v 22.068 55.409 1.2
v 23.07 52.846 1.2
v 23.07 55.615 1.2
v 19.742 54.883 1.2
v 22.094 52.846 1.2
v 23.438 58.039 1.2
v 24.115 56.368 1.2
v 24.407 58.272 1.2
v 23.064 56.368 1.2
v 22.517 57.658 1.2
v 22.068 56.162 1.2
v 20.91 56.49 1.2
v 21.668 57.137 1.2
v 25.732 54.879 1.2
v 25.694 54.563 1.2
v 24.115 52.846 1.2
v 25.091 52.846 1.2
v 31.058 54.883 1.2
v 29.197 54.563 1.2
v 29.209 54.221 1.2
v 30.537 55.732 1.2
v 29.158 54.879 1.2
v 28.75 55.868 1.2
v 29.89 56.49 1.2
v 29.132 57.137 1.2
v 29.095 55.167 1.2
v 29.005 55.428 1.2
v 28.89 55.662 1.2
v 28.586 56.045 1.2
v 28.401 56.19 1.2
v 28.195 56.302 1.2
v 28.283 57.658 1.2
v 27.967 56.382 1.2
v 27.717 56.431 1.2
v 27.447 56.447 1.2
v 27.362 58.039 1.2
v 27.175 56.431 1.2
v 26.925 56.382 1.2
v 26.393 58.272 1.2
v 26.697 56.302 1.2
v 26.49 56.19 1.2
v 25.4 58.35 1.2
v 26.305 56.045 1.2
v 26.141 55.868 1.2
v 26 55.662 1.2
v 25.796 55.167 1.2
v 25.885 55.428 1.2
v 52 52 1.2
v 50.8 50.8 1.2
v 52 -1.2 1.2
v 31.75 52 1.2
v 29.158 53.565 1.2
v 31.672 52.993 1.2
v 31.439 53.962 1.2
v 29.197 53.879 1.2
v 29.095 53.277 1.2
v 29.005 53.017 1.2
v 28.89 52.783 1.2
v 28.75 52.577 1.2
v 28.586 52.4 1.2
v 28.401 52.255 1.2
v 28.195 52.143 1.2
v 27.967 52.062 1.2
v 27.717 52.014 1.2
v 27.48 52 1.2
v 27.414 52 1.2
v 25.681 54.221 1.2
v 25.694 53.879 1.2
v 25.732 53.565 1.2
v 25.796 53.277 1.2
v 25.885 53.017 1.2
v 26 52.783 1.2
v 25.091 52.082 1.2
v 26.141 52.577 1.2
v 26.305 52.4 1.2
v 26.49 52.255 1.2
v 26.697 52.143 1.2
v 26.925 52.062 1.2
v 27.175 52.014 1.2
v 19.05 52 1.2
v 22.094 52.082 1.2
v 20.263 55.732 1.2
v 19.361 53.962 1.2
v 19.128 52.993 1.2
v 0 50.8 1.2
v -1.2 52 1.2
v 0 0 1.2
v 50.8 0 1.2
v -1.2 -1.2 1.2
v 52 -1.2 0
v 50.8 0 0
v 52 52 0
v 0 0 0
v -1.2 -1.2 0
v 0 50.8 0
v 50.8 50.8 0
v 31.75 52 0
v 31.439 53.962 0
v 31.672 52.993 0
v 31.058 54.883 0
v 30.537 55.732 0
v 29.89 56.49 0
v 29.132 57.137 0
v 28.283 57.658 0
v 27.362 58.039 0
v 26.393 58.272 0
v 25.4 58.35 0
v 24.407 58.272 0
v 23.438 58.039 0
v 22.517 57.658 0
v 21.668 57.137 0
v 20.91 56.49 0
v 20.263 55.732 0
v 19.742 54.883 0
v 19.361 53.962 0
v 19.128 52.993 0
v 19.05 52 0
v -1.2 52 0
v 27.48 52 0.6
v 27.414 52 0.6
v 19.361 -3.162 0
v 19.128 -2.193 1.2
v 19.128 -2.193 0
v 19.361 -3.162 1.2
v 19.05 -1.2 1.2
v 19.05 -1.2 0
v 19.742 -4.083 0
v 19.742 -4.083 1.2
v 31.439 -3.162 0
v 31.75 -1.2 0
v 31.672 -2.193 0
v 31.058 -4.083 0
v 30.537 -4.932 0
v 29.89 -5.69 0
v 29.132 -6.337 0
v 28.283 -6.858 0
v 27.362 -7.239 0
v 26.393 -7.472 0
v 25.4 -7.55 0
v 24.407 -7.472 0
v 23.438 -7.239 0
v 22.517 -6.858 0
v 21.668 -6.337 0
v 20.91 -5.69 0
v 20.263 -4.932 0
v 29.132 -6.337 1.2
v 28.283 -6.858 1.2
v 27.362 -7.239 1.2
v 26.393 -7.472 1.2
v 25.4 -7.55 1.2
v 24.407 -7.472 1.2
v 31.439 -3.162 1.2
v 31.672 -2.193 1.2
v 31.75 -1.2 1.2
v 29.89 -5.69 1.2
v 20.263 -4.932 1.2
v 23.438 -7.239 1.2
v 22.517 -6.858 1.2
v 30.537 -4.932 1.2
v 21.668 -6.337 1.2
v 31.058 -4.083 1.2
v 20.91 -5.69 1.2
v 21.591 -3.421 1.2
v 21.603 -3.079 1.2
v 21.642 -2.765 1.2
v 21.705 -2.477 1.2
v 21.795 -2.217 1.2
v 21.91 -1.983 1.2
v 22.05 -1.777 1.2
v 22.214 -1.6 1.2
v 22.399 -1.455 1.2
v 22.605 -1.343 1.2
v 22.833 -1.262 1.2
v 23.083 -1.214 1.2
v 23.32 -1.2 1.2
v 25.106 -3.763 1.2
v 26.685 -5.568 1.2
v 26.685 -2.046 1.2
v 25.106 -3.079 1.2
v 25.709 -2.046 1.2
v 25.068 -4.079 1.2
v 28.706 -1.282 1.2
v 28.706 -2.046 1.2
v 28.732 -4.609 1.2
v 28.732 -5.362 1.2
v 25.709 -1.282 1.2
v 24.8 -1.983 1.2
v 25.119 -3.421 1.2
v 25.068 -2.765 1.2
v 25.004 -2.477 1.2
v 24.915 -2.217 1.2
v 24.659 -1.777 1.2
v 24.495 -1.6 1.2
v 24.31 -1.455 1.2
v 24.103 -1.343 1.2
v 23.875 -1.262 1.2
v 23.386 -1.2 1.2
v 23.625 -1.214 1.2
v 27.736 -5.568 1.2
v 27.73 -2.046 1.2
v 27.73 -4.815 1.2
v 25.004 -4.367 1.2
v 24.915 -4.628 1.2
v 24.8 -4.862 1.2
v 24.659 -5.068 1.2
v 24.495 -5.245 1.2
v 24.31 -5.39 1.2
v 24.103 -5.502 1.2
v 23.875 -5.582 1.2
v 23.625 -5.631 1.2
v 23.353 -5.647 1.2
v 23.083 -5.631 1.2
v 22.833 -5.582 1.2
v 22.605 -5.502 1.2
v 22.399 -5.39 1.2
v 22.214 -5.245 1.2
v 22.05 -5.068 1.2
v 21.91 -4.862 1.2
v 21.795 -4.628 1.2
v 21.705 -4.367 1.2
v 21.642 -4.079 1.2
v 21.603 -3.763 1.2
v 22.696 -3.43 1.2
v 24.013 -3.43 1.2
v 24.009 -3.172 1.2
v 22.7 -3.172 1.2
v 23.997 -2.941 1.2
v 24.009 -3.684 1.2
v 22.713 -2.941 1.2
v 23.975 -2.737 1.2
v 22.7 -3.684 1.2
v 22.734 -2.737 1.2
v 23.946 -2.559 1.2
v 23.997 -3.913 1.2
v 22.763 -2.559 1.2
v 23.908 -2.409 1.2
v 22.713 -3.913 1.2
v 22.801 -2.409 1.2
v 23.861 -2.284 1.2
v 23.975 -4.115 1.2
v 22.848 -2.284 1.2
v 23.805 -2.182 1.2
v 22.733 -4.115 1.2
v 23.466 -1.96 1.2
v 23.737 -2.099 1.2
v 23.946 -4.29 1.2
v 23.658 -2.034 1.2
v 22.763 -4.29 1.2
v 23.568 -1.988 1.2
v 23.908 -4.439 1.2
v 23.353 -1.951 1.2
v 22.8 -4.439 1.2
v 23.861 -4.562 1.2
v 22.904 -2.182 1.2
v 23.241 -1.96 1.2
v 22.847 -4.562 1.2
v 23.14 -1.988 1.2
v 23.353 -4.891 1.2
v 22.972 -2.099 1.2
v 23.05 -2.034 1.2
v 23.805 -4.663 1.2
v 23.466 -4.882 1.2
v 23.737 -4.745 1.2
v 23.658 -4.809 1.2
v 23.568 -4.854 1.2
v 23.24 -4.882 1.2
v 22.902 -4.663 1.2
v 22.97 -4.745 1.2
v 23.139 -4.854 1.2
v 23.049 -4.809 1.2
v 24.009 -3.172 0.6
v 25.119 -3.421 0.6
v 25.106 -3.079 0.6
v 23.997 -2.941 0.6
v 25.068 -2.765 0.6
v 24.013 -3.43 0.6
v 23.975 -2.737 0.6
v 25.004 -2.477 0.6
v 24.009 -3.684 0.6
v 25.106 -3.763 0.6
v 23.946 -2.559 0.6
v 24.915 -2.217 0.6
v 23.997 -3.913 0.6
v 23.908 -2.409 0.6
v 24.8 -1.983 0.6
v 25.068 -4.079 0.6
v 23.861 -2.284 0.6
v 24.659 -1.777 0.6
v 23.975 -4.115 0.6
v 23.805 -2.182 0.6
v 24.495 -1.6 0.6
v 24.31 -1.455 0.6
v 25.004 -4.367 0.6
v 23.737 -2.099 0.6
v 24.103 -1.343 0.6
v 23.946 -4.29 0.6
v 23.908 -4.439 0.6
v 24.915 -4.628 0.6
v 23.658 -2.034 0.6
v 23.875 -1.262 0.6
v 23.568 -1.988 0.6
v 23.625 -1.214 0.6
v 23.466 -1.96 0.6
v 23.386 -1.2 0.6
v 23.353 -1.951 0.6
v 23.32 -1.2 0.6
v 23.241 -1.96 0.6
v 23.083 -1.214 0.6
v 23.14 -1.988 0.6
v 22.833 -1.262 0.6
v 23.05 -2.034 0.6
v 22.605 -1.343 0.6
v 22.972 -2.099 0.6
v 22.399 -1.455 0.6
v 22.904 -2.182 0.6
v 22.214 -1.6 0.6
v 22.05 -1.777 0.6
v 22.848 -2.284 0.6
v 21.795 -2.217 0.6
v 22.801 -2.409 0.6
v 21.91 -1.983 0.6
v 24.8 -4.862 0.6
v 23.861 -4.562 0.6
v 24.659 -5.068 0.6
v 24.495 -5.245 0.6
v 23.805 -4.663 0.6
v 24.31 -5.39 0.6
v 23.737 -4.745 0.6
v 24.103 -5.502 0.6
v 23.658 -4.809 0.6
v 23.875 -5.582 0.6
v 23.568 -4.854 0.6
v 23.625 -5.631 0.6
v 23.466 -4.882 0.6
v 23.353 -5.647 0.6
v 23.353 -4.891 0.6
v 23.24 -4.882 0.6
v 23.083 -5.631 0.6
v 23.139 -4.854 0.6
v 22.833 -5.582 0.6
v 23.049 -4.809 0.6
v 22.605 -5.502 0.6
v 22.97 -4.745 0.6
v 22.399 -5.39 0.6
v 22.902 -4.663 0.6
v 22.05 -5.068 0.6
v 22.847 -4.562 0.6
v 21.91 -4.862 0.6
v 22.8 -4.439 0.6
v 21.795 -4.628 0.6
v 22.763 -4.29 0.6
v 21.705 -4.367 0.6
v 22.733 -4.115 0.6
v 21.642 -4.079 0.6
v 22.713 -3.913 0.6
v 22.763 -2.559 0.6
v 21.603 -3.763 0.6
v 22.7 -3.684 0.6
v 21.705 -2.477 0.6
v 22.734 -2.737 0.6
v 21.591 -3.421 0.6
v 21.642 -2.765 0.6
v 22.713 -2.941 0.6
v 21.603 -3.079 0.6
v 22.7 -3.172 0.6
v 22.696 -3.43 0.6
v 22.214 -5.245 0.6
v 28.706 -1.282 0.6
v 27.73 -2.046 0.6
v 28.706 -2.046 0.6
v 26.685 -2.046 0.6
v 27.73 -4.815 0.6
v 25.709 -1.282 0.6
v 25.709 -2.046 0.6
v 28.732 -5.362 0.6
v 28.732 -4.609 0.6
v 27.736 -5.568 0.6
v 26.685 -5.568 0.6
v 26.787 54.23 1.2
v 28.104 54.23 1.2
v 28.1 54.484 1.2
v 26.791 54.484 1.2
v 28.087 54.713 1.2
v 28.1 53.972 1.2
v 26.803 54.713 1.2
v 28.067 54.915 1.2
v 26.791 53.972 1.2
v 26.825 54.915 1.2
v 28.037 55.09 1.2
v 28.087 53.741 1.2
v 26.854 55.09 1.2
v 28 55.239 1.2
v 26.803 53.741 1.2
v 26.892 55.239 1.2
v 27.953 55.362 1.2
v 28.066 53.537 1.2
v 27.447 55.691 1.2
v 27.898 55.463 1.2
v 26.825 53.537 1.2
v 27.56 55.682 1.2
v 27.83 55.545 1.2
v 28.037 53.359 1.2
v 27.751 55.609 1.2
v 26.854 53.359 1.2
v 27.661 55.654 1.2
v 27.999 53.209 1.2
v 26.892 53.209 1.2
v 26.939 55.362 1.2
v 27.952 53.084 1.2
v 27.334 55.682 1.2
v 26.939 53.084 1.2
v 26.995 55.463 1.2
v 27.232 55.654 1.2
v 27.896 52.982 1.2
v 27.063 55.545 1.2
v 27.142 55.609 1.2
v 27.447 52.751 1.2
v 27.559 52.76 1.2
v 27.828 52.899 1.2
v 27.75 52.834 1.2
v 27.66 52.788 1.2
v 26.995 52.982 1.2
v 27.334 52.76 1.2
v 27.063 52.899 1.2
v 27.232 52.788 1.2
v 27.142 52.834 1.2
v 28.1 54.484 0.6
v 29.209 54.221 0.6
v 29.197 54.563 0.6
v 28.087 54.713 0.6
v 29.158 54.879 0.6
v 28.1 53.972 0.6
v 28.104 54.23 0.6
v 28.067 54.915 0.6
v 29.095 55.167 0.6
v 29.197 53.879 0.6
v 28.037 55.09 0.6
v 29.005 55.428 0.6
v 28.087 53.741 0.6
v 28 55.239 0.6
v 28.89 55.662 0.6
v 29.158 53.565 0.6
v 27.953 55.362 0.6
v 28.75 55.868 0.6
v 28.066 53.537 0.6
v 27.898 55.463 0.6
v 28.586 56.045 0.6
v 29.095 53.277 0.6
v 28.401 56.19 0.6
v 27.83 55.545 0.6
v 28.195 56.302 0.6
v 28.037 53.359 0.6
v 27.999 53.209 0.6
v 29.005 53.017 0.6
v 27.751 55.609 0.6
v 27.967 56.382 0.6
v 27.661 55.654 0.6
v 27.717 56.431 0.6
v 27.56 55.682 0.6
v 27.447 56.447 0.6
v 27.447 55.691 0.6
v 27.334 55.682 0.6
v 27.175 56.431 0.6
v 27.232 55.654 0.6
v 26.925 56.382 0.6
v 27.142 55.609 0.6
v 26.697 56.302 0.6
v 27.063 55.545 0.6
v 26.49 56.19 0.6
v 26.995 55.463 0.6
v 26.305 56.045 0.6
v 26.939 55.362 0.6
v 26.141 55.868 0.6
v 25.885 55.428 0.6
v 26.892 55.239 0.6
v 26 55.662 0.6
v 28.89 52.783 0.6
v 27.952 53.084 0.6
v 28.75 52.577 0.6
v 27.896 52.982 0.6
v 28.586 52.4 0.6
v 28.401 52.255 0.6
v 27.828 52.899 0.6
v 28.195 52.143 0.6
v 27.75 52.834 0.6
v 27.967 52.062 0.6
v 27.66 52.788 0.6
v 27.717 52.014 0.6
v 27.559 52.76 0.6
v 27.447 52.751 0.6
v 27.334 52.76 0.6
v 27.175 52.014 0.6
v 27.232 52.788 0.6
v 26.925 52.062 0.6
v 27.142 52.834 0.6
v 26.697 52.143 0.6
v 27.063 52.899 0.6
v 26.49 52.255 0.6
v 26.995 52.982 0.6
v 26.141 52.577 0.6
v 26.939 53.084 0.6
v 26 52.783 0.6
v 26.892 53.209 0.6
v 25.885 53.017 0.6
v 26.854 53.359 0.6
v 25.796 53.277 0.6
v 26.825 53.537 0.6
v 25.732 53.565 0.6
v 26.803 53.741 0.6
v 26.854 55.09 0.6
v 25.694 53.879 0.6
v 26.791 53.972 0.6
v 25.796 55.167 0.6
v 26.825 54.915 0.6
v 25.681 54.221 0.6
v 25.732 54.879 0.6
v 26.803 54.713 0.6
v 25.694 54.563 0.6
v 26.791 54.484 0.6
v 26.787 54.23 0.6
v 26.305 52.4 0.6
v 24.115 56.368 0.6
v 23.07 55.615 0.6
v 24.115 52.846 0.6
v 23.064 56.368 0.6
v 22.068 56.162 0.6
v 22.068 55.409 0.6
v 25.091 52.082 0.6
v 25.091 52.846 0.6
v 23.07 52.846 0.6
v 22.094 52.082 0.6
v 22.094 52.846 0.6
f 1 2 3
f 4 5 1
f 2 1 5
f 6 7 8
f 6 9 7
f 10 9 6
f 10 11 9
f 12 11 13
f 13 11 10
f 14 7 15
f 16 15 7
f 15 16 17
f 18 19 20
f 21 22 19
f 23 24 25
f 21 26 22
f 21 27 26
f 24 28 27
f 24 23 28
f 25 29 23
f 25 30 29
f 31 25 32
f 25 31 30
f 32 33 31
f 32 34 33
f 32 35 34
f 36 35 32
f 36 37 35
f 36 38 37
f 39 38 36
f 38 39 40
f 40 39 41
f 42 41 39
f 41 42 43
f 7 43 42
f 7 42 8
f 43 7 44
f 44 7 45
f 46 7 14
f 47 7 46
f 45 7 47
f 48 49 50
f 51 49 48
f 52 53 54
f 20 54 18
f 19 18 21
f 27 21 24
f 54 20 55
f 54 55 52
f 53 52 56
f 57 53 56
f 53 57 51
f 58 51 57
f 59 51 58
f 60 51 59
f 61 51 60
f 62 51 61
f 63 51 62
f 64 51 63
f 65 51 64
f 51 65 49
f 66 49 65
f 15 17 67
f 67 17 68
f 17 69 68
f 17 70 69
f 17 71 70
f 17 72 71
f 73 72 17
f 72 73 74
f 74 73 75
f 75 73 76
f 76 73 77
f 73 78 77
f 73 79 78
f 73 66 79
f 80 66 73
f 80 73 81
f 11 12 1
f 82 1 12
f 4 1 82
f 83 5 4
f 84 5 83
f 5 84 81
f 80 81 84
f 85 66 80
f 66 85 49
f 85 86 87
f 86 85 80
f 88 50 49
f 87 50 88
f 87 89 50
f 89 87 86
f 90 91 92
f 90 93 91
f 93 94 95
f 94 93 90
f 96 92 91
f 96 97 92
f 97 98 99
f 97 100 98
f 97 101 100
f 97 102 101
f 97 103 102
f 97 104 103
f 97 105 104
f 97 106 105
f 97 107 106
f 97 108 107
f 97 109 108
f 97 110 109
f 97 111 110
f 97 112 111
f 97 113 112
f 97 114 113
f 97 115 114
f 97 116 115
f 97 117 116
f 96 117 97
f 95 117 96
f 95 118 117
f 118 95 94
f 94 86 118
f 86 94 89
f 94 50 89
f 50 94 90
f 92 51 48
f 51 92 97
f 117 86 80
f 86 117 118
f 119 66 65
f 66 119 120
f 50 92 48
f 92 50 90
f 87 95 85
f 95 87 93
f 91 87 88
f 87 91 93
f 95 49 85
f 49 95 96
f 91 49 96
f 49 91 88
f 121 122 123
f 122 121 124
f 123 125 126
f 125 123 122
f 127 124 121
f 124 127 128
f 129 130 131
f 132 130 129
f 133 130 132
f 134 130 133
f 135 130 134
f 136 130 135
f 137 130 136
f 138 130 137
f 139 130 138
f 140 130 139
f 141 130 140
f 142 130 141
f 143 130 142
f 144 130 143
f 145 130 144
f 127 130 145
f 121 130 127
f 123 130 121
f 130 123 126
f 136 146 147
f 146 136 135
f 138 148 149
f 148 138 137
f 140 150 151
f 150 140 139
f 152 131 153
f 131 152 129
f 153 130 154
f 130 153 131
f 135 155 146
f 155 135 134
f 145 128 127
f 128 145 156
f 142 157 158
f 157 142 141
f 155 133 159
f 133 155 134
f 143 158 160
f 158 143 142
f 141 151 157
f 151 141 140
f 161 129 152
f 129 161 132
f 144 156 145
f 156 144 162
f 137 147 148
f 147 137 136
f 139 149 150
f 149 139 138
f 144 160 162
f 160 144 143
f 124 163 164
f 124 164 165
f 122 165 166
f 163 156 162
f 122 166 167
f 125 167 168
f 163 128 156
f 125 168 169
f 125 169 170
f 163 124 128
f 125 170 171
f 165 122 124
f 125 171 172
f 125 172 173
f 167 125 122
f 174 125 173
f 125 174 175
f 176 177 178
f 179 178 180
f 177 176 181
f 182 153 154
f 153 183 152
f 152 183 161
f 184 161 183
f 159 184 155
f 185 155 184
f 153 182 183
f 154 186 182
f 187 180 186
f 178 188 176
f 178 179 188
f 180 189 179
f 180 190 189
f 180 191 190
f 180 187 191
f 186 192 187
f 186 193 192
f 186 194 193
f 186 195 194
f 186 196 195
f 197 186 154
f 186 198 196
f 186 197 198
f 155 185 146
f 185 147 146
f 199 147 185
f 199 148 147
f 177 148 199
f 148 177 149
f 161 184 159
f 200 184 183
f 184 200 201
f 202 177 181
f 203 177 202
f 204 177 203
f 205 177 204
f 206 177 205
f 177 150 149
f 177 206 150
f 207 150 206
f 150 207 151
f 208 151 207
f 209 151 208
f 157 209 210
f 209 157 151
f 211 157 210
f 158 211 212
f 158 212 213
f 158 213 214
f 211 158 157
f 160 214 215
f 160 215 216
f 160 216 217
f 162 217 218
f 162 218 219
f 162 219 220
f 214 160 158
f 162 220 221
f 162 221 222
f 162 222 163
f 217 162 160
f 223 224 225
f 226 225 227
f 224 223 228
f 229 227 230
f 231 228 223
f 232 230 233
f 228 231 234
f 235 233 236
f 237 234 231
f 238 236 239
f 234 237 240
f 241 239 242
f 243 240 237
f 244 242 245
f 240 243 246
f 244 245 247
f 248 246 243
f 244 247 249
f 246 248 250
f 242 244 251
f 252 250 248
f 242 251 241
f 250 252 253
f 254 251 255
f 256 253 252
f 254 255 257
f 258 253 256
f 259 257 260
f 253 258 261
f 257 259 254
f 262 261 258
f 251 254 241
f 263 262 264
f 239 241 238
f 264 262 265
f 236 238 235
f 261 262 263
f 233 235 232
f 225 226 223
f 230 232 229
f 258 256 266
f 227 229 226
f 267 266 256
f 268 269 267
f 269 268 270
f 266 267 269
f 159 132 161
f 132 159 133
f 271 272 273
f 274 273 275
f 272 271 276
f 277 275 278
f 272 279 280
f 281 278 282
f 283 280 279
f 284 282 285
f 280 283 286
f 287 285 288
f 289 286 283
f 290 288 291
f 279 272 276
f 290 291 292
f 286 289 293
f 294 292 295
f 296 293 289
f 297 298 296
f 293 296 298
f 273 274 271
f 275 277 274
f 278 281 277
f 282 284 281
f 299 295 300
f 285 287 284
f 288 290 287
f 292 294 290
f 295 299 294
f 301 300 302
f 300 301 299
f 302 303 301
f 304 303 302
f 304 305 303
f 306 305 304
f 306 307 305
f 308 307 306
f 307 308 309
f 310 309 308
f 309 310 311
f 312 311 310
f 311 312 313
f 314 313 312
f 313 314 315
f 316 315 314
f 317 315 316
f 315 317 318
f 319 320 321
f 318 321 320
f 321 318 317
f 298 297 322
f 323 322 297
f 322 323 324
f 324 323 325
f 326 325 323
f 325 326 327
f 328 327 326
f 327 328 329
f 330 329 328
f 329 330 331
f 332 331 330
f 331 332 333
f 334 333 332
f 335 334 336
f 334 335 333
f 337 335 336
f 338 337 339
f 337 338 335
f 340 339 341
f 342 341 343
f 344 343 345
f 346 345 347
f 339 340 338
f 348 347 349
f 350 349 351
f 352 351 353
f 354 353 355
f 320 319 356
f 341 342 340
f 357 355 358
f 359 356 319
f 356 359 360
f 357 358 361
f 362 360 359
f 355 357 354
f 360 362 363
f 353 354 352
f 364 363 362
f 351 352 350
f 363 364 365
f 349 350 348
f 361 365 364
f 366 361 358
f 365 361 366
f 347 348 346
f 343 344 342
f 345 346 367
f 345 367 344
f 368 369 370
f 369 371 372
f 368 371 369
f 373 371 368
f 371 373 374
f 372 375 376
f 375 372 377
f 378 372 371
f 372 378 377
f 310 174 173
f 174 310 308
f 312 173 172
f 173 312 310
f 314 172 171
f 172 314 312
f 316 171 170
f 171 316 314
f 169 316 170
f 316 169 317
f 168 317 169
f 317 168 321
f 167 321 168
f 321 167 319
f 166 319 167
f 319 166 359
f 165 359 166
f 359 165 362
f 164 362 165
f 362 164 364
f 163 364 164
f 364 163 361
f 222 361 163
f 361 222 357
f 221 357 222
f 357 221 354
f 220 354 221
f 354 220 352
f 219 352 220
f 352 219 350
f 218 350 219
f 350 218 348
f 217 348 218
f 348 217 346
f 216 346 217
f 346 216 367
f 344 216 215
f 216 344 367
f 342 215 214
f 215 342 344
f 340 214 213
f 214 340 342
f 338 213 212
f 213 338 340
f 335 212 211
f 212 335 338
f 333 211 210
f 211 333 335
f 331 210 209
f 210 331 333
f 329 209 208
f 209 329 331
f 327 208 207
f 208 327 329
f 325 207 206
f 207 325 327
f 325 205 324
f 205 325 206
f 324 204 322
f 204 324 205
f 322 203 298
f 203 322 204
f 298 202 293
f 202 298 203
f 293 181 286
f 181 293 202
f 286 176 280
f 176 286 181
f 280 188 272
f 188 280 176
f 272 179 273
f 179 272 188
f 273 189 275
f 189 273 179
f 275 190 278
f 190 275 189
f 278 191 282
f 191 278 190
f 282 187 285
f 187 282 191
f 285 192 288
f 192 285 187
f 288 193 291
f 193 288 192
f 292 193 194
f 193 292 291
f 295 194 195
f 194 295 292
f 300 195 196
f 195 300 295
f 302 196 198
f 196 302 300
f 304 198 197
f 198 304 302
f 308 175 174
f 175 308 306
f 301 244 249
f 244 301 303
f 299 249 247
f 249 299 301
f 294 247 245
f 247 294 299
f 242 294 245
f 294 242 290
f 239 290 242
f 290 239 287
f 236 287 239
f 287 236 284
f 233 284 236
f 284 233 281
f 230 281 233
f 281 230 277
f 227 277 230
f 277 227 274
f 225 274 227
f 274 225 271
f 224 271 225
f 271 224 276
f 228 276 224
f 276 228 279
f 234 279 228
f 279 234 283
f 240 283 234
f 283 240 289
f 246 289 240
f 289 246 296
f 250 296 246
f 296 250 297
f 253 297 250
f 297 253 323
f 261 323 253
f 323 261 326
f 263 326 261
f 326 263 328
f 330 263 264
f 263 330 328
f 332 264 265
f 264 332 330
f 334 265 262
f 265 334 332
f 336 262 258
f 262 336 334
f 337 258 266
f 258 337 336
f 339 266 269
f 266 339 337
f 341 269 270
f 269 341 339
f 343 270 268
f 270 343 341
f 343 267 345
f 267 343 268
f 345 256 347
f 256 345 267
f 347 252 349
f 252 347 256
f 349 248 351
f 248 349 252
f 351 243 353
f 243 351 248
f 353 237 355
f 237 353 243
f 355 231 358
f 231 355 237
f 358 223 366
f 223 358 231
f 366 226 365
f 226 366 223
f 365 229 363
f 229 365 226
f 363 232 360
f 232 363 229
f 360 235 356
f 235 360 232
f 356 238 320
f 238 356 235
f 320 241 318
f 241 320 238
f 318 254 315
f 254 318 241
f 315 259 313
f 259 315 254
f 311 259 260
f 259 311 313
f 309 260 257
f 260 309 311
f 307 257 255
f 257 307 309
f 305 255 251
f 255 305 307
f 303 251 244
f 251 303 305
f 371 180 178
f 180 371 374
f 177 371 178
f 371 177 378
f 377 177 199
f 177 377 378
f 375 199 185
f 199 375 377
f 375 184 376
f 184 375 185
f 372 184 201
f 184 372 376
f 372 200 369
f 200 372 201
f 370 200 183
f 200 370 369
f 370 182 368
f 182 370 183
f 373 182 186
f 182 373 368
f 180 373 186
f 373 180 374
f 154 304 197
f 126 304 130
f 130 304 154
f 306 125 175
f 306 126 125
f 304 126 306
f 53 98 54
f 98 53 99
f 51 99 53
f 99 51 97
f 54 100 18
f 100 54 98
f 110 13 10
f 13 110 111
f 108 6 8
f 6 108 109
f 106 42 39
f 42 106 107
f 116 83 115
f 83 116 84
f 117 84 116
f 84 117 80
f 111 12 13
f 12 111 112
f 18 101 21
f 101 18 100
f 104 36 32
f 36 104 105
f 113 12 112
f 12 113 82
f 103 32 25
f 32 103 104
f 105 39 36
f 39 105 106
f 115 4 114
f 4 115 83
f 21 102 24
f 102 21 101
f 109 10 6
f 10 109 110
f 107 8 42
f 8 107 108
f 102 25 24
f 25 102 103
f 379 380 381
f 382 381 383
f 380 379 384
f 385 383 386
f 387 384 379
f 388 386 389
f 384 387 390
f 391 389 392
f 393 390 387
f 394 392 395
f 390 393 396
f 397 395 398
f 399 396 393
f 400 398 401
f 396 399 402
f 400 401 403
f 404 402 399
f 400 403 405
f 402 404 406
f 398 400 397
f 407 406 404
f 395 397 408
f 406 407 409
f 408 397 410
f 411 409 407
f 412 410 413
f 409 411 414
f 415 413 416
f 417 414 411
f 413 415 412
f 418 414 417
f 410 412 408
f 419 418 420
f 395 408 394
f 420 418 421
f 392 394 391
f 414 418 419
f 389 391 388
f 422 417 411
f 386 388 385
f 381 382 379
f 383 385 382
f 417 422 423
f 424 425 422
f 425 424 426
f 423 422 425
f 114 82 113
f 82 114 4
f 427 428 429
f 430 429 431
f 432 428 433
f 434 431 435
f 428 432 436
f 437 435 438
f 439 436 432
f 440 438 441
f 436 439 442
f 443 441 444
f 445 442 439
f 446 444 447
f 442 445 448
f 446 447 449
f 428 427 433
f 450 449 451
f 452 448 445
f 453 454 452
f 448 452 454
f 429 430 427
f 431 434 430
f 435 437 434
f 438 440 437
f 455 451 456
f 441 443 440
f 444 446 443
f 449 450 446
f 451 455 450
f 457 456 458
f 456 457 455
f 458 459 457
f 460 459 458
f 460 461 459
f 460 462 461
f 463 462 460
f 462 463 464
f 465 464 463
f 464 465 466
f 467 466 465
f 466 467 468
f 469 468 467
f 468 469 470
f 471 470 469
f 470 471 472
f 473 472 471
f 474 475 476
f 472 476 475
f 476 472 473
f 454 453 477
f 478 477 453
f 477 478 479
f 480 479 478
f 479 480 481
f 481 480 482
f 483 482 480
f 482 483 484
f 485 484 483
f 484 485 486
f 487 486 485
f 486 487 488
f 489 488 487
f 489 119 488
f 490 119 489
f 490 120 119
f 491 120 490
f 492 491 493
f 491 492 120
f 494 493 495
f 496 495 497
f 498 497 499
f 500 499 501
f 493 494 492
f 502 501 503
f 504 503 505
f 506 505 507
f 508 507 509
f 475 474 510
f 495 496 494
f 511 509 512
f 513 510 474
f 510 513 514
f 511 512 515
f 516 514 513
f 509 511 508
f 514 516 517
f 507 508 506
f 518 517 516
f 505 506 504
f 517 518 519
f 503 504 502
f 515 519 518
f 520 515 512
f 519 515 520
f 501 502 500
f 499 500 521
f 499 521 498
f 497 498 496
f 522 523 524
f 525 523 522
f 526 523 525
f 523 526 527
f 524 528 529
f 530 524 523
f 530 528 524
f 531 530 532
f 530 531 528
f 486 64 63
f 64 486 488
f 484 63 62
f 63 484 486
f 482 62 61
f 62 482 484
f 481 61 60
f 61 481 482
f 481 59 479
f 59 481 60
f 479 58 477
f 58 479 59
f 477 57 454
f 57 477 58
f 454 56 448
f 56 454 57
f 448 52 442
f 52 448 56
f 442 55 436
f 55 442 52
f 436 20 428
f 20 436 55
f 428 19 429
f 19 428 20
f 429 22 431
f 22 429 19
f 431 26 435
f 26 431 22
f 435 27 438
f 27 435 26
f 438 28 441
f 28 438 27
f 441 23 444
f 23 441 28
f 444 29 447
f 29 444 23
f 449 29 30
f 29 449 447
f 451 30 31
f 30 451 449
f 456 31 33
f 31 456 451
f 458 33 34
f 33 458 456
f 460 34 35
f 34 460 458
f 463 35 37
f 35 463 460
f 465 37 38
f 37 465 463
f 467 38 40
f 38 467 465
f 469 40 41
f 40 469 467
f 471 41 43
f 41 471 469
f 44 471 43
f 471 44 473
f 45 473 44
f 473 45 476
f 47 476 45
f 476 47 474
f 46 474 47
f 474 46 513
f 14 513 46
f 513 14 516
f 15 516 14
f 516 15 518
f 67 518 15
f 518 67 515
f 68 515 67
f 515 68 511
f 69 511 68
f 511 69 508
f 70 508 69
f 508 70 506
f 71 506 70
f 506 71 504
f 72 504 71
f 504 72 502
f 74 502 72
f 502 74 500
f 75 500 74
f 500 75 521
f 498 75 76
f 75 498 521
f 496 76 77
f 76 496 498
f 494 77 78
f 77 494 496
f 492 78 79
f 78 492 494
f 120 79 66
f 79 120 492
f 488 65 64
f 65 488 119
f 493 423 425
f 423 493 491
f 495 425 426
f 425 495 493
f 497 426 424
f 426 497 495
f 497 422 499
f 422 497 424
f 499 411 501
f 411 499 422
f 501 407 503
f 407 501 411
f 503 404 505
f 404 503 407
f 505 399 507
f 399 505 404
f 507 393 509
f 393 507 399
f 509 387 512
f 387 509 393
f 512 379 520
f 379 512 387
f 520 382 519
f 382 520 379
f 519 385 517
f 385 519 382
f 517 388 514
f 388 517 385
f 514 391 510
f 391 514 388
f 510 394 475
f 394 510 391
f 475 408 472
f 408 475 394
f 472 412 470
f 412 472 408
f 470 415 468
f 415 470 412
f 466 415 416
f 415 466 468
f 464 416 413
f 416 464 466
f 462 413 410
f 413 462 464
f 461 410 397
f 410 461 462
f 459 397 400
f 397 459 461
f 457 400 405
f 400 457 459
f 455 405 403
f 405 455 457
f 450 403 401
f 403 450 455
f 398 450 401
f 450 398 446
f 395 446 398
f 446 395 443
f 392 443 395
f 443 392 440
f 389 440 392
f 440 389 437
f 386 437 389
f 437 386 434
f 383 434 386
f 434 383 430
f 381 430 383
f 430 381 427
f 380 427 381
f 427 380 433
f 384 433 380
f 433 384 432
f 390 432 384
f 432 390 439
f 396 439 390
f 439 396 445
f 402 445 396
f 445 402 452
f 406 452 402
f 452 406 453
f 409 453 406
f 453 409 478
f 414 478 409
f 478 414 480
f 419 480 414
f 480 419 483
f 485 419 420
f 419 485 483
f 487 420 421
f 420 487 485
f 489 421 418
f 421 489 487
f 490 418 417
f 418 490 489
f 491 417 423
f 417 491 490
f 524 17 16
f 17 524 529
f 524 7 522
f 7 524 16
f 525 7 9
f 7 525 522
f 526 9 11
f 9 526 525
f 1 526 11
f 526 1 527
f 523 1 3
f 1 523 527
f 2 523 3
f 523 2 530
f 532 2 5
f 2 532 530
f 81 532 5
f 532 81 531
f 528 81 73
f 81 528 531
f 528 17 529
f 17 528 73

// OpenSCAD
inch=25.4;
stroke=1.2;
height=1.2;
font_size=inch/6;
font_face="PT Mono:style=Bold";
$fn=40;

module tag(txt) {
    rotate([0, 0, 180]) difference(){
        cylinder(stroke, inch/4, inch/4);
        translate([0, 0, stroke/2]) linear_extrude(height=stroke/2) text(txt, size=font_size, font=font_face, valign="bottom", halign="center");
        translate([-inch/4, -inch/2, 0]) cube([inch/2, inch/2, stroke]);
    }
}

module status_box(txt) {
    union(){
        difference(){
            translate([-inch/2-stroke, -inch/2-stroke, 0]) cube([inch+stroke*2, inch+stroke*2, height]);
            translate([-inch/2, -inch/2, 0]) cube([inch, inch, height]);
        }
        translate([0, -inch/2, height]) tag(txt);
        rotate([0, 0, 180]) translate([0, -inch/2, height]) tag(txt);
    }
}

function is_in_radius(r, x, y) = sqrt(x*x+y*y) < r;

module effect_radius_base(boxes, stroke) {
    union() {
        for(x = [-boxes : 1 : boxes-1], y = [-boxes : 1 : boxes-1]) {
            x_center = x*inch+inch/2;
            y_center = y*inch+inch/2;
            if (is_in_radius(boxes*inch, x_center, y_center)) {
                translate([x*inch-stroke, y*inch-stroke, 0]) cube([inch+stroke*2, inch+stroke*2, height]);
            }
        }
    }
}

module effect_radius(r) {
    boxes = r/5;
    union() {
        difference() {
            effect_radius_base(boxes, stroke);
            effect_radius_base(boxes, 0);
        }
        translate([0, -inch*boxes-stroke, 0]) tag(str(r));
        rotate([0, 0, 180]) translate([0, -inch*boxes-stroke, 0]) tag(str(r));
    }
}

module matrix_base(matrix, stroke) {
    union() {
        for (x = [0 : 1 : len(matrix)-1]) {
            for (y = [0 : 1 : len(matrix[x])-1]) {
                if (matrix[x][y] != 0) {
                    translate([x*inch-stroke, y*inch-stroke, 0]) cube([inch+stroke*2, inch+stroke*2, height]);
                }
            }
        }
    }
}

module diagonal_cone(r) {
    boxes = r/5;
    matrix = [for (x = [0 : 1 : boxes-1]) [for (y = [0 : 1 : boxes-1]) x >= y ? 1 : 0 ] ];
    union() {
        difference() {
            matrix_base(matrix, stroke);
            matrix_base(matrix, 0);
        }
        translate([boxes*inch/2, 0, height]) tag(str(r));
        translate([boxes*inch/2, ceil(boxes/2)*inch, height]) rotate([0, 0, 180]) tag(str(r));
    }
}

module straight_cone(r) {
    //TODO - actually use r...
    matrix = [[0,1,0],[1,1,1],[1,1,1]];
    boxes = r/5;
    union() {
        difference() {
            matrix_base(matrix, stroke);
            matrix_base(matrix, 0);
        }
        translate([boxes*inch/2, 0, height]) tag(str(r));
        translate([boxes*inch/2, boxes*inch, height]) rotate([0, 0, 180]) tag(str(r));
    }
}

module square_base(boxes, stroke) {
    union() {
        for(x = [0 : 1 : boxes-1], y = [0 : 1 : boxes-1]) {
            translate([x*inch-stroke, y*inch-stroke, 0]) cube([inch+stroke*2, inch+stroke*2, height]);
        }
    }
}

module square_area(l) {
    boxes = l/5;
    union() {
        difference() {
            square_base(boxes, stroke);
            square_base(boxes, 0);
        }
        translate([boxes/2*inch, -stroke, 0]) tag(str(l));
        translate([boxes/2*inch, inch*boxes+stroke, 0]) rotate([0, 0, 180]) tag(str(l));
    }
}
//effect_radius(15);
//status_box("CON");
//diagonal_cone(30);
//straight_cone(15);
square_area(10);
